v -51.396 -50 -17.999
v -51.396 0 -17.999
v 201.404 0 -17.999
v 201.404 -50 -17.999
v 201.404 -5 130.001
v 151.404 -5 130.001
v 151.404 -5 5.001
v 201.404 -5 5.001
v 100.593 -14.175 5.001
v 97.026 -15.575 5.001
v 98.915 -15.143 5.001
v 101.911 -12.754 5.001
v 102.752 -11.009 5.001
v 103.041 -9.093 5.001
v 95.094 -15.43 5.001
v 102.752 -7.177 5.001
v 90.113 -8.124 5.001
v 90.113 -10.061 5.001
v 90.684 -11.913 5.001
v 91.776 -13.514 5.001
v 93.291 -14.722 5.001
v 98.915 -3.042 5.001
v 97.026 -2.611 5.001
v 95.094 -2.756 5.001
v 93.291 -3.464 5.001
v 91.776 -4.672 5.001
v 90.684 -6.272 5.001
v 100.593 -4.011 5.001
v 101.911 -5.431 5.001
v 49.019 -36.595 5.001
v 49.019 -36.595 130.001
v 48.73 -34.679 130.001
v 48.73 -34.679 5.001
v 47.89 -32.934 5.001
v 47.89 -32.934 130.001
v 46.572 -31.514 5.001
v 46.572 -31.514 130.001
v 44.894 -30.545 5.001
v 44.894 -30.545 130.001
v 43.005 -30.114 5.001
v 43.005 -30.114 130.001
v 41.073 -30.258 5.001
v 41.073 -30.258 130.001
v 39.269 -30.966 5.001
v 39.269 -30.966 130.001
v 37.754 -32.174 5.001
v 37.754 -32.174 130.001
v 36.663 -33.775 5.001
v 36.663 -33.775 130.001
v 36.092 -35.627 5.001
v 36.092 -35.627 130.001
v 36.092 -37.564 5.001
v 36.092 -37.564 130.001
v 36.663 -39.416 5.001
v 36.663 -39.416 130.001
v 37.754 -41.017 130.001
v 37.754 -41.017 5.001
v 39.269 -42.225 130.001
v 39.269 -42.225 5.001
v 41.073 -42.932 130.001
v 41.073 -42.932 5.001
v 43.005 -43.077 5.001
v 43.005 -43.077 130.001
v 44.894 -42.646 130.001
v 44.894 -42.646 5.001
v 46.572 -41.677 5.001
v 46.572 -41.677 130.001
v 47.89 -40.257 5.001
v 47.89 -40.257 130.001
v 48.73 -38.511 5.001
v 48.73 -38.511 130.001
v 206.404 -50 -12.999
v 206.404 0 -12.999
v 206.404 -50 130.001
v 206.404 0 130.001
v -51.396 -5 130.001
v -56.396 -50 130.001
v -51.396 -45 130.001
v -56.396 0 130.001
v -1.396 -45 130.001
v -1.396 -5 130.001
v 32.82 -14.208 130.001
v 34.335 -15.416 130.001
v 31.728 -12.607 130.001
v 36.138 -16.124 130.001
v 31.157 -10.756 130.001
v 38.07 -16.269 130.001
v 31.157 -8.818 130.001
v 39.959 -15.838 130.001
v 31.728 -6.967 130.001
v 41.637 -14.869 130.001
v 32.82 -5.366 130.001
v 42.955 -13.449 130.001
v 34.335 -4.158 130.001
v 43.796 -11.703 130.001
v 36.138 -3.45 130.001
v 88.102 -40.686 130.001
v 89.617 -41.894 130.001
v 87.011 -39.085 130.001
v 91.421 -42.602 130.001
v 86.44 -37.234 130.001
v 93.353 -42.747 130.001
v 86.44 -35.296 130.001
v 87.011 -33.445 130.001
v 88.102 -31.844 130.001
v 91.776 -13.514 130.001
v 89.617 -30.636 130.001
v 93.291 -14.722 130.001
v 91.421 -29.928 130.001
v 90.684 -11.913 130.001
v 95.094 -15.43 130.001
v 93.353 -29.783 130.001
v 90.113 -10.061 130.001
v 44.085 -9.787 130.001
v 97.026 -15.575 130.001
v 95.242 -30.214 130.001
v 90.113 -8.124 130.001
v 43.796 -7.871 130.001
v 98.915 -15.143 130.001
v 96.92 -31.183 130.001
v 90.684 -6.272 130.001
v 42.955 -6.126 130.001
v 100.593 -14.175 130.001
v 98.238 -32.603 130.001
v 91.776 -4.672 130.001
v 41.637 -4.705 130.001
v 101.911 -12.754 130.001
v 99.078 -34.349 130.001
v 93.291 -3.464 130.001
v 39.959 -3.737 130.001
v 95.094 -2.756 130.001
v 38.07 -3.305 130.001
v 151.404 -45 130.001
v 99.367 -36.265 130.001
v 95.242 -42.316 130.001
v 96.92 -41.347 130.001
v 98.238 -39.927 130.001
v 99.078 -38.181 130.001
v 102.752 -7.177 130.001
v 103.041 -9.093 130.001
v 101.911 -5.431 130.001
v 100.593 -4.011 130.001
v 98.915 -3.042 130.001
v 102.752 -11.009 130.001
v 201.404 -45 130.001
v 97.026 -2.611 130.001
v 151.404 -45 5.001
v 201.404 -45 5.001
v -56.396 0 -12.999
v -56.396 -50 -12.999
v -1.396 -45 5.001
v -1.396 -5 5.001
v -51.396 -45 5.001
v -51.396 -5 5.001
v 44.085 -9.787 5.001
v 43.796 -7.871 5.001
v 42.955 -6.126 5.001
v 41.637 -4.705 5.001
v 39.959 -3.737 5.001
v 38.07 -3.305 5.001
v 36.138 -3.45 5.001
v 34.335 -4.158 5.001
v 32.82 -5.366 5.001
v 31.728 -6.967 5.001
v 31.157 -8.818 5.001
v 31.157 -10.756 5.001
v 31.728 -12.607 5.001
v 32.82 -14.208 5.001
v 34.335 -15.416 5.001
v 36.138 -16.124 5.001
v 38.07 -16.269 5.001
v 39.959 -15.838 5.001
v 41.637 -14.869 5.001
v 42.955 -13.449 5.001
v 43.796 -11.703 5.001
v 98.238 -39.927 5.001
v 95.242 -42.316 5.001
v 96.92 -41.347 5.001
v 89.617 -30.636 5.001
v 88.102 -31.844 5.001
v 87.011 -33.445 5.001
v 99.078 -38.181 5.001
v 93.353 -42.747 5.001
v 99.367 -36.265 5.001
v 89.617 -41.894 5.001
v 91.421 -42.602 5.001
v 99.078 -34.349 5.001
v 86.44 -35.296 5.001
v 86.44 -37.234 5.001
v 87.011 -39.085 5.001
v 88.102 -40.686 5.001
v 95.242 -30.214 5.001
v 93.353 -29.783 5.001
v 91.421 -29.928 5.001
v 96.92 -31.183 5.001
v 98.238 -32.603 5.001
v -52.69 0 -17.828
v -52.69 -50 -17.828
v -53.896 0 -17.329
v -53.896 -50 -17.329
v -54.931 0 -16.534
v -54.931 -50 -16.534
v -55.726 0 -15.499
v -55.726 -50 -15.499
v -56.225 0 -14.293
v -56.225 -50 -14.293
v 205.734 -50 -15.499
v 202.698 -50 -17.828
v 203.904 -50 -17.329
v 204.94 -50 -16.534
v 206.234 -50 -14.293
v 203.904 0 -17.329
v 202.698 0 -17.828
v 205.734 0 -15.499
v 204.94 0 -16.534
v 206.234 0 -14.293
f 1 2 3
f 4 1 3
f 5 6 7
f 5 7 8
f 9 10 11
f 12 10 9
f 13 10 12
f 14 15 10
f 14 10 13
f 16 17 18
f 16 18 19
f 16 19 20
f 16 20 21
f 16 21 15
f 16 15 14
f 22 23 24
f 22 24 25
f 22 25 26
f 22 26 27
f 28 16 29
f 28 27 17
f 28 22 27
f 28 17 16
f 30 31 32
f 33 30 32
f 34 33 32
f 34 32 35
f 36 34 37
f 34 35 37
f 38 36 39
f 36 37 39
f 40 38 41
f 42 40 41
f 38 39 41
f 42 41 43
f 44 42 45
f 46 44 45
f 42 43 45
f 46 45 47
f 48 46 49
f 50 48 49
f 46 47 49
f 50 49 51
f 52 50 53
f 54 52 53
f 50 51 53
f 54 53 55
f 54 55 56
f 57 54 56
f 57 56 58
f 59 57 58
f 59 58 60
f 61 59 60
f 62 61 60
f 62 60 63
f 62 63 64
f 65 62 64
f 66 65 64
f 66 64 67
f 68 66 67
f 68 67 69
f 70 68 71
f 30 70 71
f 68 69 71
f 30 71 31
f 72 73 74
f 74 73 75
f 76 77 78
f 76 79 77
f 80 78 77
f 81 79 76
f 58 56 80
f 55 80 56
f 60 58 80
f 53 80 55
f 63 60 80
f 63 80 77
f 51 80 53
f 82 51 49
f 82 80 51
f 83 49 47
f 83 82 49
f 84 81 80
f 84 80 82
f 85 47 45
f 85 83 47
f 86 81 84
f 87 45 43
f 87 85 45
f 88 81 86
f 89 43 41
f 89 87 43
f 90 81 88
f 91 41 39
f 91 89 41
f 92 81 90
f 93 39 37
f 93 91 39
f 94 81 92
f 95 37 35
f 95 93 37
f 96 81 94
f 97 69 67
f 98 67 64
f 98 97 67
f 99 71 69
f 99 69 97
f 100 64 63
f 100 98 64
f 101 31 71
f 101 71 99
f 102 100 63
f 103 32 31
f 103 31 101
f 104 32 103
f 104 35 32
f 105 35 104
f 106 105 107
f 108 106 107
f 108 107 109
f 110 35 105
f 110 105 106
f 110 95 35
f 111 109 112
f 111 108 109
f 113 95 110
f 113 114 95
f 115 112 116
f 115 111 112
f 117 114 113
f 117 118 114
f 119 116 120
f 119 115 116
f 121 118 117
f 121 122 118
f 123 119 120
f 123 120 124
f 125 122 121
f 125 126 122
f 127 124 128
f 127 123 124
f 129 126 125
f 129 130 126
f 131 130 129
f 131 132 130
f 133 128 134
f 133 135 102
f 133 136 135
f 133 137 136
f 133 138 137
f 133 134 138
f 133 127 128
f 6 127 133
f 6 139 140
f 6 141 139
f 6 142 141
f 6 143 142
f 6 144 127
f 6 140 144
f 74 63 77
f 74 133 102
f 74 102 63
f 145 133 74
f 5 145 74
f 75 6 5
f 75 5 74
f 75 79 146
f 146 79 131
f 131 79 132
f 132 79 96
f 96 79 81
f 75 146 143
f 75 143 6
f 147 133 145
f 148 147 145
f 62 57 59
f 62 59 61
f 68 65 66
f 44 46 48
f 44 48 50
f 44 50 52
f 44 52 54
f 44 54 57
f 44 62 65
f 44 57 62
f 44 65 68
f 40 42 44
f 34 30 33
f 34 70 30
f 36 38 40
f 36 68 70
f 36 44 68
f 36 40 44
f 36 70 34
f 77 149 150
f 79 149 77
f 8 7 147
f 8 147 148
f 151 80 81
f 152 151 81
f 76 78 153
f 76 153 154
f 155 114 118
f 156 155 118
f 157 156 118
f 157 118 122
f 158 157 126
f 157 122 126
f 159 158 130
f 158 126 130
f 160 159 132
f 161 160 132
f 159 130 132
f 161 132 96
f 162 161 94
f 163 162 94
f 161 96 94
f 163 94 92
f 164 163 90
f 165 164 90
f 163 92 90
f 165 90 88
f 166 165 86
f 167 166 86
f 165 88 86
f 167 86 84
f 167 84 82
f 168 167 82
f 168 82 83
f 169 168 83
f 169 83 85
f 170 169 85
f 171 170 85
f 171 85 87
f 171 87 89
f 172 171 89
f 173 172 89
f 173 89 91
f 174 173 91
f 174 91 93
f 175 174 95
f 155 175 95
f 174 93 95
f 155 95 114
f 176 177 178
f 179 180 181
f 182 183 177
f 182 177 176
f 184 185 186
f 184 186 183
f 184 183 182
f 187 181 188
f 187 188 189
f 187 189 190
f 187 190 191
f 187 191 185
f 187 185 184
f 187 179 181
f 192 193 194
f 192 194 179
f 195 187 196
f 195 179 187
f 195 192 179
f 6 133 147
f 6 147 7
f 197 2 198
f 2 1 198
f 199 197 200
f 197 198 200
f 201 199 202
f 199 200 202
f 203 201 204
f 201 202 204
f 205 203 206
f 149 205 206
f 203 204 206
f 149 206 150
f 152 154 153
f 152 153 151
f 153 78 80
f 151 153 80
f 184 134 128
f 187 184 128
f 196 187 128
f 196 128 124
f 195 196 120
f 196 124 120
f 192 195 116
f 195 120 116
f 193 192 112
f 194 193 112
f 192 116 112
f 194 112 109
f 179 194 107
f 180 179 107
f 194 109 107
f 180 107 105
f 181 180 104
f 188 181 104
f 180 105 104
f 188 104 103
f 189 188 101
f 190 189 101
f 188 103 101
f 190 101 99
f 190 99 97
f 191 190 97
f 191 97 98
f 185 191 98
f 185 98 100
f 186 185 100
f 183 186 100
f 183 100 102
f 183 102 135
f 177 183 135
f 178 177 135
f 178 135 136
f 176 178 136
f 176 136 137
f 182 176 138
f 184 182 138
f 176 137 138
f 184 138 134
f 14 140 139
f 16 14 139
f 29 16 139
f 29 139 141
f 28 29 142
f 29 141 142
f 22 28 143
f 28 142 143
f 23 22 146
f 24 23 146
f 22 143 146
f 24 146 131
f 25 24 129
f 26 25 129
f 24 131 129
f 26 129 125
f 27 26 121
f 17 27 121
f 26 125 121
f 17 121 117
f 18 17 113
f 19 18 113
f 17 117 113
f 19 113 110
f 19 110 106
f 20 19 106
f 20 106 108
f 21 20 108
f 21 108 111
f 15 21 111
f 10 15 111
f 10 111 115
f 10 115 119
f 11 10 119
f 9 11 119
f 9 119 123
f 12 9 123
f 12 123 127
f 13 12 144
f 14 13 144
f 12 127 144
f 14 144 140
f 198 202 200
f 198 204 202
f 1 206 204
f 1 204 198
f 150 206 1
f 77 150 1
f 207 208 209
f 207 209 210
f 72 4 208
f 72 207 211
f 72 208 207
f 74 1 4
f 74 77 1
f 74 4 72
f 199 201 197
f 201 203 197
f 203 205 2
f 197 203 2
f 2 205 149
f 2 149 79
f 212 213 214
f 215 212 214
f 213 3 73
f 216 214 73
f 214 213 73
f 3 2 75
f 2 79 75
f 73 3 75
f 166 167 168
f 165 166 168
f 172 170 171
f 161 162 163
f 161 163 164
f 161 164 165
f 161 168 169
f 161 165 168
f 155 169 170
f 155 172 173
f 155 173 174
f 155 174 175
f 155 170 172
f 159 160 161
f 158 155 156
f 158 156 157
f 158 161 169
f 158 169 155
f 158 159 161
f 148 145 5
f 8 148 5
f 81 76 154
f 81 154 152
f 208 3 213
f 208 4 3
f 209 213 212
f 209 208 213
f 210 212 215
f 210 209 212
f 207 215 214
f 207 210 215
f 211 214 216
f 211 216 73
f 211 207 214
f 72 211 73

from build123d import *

# Parameters (mm, degrees)
F0_W     = 262.8
F0_H     = 148
F1_DEPTH = 50
F2_R     = 5
F3_R     = 5
F4_W     = 50
F4_H     = 40
F4_R     = 6.5
F5_DEPTH = 125


with BuildPart() as f1:
    # F0 (on Front) → F1 (new body)
    with BuildSketch(Plane.XZ):
        with Locations((75.004346, 56.001419)):
            Rectangle(F0_W, F0_H)
    extrude(amount=F1_DEPTH)

    # F2
    f2_edges = [f1.edges().sort_by_distance(p)[0] for p in [
        (206.404346, -25, -17.998581),
    ]]
    fillet(f2_edges, radius=F2_R)

    # F3
    f3_edges = [f1.edges().sort_by_distance(p)[0] for p in [
        (-56.395654, -25, -17.998581),
    ]]
    fillet(f3_edges, radius=F3_R)

    # F4 (on face) → F5 (cut)
    with BuildSketch(Plane.XY.offset(130.001419)):
        with Locations((-26.395654, -25)):
            Rectangle(F4_W, F4_H)
        with Locations((37.584728, -9.787194)):
            Circle(F4_R)
        with Locations((96.540727, -9.092722)):
            Circle(F4_R)
        with Locations((42.519221, -36.595406)):
            Circle(F4_R)
        with Locations((92.867015, -36.265045)):
            Circle(F4_R)
        with Locations((176.404346, -25)):
            Rectangle(F4_W, F4_H)
    extrude(amount=-F5_DEPTH, mode=Mode.SUBTRACT)


solid = f1.part
